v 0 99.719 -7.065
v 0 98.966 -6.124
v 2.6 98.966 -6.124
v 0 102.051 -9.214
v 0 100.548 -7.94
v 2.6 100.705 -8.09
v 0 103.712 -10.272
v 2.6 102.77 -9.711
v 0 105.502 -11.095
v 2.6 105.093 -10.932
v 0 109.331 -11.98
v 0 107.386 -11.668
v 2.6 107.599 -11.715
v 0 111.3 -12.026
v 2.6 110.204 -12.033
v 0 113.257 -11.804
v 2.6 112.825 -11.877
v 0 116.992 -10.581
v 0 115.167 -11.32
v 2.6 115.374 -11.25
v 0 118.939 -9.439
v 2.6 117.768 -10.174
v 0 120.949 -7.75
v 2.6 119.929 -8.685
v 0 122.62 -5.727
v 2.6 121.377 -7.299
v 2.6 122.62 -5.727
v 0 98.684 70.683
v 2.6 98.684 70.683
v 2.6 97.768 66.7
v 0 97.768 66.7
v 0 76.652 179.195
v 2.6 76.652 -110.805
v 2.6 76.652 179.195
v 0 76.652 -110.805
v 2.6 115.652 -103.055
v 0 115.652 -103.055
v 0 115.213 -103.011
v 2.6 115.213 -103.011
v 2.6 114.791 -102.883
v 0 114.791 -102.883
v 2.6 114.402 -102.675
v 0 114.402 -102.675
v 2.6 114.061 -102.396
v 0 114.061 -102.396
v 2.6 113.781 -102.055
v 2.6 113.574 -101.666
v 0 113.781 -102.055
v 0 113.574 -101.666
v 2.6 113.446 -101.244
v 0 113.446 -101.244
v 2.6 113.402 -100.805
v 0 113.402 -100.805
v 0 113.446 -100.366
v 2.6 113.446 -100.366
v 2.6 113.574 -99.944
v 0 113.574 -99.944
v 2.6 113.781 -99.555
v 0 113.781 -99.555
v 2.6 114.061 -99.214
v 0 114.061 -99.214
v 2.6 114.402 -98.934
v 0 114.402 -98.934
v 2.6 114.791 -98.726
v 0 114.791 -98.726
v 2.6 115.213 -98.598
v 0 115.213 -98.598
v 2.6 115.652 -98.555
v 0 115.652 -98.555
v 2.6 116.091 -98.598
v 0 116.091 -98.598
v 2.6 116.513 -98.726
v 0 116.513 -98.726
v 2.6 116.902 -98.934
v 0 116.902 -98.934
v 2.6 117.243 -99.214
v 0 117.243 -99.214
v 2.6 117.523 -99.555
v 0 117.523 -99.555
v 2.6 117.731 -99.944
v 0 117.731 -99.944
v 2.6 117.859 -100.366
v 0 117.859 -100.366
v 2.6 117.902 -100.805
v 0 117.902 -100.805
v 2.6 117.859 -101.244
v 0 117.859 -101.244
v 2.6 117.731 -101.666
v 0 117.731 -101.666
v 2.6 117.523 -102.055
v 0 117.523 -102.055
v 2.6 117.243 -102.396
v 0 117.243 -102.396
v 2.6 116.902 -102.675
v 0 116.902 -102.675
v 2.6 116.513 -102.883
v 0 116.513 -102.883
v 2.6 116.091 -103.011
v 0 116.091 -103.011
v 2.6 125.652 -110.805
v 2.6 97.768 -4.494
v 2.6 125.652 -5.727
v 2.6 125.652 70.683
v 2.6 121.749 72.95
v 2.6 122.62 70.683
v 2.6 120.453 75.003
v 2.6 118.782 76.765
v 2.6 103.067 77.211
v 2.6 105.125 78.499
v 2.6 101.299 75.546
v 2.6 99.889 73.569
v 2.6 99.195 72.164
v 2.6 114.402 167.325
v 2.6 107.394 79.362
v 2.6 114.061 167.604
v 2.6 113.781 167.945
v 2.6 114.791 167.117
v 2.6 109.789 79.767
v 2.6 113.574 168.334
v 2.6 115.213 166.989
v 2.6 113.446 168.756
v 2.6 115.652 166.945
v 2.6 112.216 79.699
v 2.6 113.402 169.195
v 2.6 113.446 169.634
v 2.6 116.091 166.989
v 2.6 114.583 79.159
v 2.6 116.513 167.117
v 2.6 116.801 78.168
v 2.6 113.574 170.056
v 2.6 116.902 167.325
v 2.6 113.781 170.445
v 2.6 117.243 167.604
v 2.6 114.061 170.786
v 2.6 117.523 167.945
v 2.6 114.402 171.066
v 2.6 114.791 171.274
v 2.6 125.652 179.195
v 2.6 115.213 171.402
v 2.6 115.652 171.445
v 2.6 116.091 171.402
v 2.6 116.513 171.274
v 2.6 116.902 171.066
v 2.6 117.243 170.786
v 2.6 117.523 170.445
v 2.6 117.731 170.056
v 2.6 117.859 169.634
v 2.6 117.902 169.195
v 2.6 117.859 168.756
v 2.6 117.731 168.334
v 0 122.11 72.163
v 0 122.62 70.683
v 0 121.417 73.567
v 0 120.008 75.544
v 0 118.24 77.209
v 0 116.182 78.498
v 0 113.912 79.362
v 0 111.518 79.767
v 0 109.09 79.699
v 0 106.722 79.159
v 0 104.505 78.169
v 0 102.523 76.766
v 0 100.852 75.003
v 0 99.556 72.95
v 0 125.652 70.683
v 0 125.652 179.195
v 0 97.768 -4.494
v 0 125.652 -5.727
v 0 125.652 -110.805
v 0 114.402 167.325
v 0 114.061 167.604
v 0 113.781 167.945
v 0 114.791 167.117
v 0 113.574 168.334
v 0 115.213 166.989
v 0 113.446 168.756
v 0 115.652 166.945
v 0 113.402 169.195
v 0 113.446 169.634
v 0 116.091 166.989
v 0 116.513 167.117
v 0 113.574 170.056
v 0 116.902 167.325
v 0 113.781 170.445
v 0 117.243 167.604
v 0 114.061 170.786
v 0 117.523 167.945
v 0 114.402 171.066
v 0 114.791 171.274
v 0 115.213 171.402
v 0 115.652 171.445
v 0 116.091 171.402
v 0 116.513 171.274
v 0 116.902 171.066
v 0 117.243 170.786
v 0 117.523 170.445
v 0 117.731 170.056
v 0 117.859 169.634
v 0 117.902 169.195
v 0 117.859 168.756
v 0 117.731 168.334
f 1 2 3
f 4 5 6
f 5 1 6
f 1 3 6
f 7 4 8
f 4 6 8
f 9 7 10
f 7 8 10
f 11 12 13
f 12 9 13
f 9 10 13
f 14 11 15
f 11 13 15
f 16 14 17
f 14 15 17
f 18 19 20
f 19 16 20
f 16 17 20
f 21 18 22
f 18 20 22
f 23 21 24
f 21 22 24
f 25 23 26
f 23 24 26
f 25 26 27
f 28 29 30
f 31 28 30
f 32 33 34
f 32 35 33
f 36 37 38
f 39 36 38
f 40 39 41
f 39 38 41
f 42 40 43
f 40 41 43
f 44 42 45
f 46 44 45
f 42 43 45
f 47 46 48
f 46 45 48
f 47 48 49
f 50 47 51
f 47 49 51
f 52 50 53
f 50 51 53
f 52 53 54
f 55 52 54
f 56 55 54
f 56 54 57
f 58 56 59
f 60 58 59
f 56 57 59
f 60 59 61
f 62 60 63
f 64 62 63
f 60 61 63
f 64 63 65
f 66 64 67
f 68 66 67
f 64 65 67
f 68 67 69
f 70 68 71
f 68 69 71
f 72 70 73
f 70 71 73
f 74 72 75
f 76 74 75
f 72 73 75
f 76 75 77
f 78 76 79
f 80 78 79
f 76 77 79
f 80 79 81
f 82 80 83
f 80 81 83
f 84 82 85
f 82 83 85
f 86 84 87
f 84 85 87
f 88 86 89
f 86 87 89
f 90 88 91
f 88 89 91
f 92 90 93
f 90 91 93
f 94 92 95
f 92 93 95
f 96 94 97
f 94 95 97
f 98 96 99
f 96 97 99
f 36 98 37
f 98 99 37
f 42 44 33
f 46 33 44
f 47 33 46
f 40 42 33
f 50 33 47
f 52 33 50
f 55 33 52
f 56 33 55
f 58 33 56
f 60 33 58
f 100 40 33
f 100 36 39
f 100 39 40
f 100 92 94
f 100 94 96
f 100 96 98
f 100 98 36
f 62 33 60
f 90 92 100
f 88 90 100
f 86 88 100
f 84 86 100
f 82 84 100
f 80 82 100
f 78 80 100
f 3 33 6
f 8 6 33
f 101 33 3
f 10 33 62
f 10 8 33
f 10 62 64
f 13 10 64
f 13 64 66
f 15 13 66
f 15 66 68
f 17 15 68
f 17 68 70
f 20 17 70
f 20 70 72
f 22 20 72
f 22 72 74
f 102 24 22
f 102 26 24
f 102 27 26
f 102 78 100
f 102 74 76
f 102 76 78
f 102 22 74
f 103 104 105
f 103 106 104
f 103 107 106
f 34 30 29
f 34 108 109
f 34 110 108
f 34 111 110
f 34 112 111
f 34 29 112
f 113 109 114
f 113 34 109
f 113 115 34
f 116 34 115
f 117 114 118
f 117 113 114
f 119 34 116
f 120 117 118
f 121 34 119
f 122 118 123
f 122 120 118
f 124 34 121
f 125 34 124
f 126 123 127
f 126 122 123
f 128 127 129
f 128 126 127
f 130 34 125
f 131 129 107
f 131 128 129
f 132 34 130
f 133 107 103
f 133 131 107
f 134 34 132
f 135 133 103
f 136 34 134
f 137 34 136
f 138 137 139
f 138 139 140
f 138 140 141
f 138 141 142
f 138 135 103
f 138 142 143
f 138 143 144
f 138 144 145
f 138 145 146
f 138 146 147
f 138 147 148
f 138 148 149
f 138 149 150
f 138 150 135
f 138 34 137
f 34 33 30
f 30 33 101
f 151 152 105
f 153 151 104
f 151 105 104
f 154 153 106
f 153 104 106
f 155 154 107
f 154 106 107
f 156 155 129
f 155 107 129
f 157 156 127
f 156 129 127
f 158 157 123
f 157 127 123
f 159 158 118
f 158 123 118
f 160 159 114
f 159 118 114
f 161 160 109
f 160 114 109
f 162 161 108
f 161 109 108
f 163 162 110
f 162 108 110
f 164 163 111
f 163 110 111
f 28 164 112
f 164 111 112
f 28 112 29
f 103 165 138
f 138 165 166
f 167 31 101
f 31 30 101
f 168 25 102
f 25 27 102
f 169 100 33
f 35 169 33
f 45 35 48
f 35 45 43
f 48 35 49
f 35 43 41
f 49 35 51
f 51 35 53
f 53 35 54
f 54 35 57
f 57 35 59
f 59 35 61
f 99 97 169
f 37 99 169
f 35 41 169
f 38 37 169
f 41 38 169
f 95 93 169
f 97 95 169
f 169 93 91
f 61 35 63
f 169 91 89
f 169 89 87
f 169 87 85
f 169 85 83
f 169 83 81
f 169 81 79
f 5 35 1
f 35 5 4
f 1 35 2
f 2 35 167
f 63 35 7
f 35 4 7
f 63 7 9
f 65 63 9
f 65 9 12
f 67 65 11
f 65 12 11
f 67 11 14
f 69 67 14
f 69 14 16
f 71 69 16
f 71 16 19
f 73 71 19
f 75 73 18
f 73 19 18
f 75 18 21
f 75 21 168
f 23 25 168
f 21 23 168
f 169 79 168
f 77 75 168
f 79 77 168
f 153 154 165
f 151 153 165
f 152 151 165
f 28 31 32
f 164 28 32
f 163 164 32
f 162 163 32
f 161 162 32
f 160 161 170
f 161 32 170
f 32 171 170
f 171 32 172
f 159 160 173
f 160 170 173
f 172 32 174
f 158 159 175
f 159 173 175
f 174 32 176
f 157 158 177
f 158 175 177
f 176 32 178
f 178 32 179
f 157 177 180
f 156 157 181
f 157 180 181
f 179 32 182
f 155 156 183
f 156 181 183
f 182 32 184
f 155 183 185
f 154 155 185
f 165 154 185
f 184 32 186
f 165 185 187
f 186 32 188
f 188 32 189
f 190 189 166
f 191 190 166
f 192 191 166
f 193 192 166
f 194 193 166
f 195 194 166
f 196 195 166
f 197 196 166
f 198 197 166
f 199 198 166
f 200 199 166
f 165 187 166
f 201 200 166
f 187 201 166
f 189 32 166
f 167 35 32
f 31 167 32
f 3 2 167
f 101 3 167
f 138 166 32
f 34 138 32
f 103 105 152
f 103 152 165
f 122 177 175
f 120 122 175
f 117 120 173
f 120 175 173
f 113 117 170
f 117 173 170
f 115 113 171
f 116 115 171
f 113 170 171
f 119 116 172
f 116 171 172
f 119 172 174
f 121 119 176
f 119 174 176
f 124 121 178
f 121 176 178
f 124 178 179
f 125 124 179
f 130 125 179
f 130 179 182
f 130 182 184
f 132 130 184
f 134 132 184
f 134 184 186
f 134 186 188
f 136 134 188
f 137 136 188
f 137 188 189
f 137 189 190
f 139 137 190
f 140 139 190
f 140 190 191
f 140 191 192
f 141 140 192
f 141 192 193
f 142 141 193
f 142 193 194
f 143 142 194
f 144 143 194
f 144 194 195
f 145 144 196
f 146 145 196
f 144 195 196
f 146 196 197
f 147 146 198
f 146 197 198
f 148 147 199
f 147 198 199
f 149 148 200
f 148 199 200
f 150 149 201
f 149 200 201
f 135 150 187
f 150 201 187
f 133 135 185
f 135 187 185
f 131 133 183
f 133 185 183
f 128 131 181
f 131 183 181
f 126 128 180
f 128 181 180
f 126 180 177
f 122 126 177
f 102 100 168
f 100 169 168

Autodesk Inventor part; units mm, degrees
ref_plane "YZ Plane" through (0, 0, 0) normal (1, 0, 0) x (0, 1, 0)
ref_plane "XZ Plane" through (0, 0, 0) normal (0, 1, 0) x (-1, 0, 0)
sketch "スケッチ1" plane through (0, 0, 0) normal (1, 0, 0) x (0, 1, 0)
  line L0 (125.6523, 179.1954) -> (-474.3477, 179.1954)
  line L1 (-474.3477, 179.1954) -> (-474.3477, -102.8046)
  line L2 (-474.3477, -102.8046) -> (125.6523, -102.8046)
  line L3 (125.6523, -102.8046) -> (125.6523, 179.1954)
  dimension "d0" = 600
  dimension "d1" = 282
extrude "押し出し1" add sketch "スケッチ1" along normal blind 2.6
sketch "スケッチ4" plane through (2.6, 0, 0) normal (1, 0, 0) x (0, 0, -1)
  line L0 (102.8046, 125.6523) -> (-179.1954, 125.6523) projected
  line L1 (-179.1954, 125.6523) -> (-179.1954, -474.3477) projected
  point P0 (0, 0)
  point P1 (-139.1954, -225.3477)
  point P2 (-139.1954, -123.3477)
  dimension "d19" = 102
  dimension "d20" = 249
  dimension "d21" = 40
  dimension "d22" = 40
hole "穴2" at (2.6, -225.3477, 139.1954) at (2.6, -123.3477, 139.1954) direction (-1, 0, 0) diameter 6.6 end through all
sketch "スケッチ5" plane through (2.6, 0, 0) normal (1, 0, 0) x (0, 0, -1)
  line L0 (-179.1954, 125.6523) -> (-179.1954, -474.3477) projected
  line L1 (102.8046, 125.6523) -> (-179.1954, 125.6523) projected
  point P0 (-152.1954, -84.3477)
  dimension "d30" = 27
  dimension "d31" = 210
hole "穴3" at (2.6, -84.3477, 152.1954) direction (-1, 0, 0) diameter 18 end through all
sketch "スケッチ6" plane through (2.6, 0, 0) normal (1, 0, 0) x (0, 0, -1)
  line L0 (-179.1954, 125.6523) -> (-179.1954, -474.3477) projected
  circle A0 centre (-152.1954, -84.3477) radius 9 projected
  point P0 (0, 0)
  point P1 (-166.6954, -53.9477)
  point P2 (-151.6954, -53.9477)
  dimension "d39" = 12.5
  dimension "d40" = 27.5
  dimension "d41" = 30.4
  dimension "d42" = 30.4
hole "穴4" at (2.6, -53.9477, 166.6954) at (2.6, -53.9477, 151.6954) direction (-1, 0, 0) diameter 4.5 end through all
sketch "スケッチ7" plane through (2.6, 0, 0) normal (1, 0, 0) x (0, 0, -1)
  line L0 (102.8046, 125.6523) -> (-179.1954, 125.6523) projected
  line L1 (102.8046, -474.3477) -> (102.8046, 125.6523) projected
  line L2 (-179.1954, -474.3477) -> (102.8046, -474.3477) projected
  point P0 (0, 0)
  point P1 (84.0046, -56.9477)
  point P2 (84.0046, -291.9477)
  dimension "d50" = 182.6
  dimension "d51" = 18.8
  dimension "d52" = 18.8
  dimension "d53" = 182.4
hole "穴5" at (2.6, -56.9477, -84.0046) at (2.6, -291.9477, -84.0046) direction (-1, 0, 0) diameter 6.7 end through all
sketch "スケッチ8" plane through (2.6, 0, 0) normal (1, 0, 0) x (0, 0, -1)
  line L0 (102.8046, -474.3477) -> (102.8046, 125.6523) projected
  line L1 (102.8046, 125.6523) -> (110.8046, 125.6523)
  line L2 (117.7603, -23.9477) -> (102.8046, -23.9477)
  line L3 (102.8046, -89.9477) -> (117.7603, -89.9477)
  line L4 (110.8046, 125.6523) -> (110.8046, -474.3477)
  line L5 (110.8046, -474.3477) -> (102.8046, -474.3477)
  line L6 (102.8046, -258.9477) -> (110.8046, -258.9477)
  line L7 (102.8046, -324.9477) -> (110.8046, -324.9477)
  circle A0 centre (84.0046, -56.9477) radius 3.35 projected
  circle A1 centre (84.0046, -291.9477) radius 3.35 projected
  point P0 (0, 0)
  point P1 (110.8046, -23.9477)
  point P2 (110.8046, -89.9477)
  dimension "d61" = 8
  dimension "d62" = 33
  dimension "d63" = 33
  dimension "d64" = 33
  dimension "d65" = 33
extrude "押し出し3" add sketch "スケッチ8" against normal blind 2.6 contours L0 L7 L4 L5 | L0 L3 L4 L6 | L0 L1 L4 L2
sketch "スケッチ9" plane through (2.6, 0, 0) normal (1, 0, 0) x (0, 0, -1)
  ellipse E0 centre (-2.4593, 110.6523) end of major axis (-2.4593, 125.1521) minor radius 14.4996 (5.606, 98.6026) -> (5.606, 122.702) ccw
  line L0 (4.4935, 123.5363) -> (-99.9579, 123.5363) projected
  line L1 (-99.9579, 97.7683) -> (4.4935, 97.7683) projected
  ellipse E1 centre (-67.383, 110.6523) end of major axis (-67.383, 123.067) minor radius 12.4145 (-70.683, 122.6204) -> (-70.683, 98.6842) ccw projected
  line L2 (-70.683, 122.6204) -> (-70.683, 125.6523)
  line L3 (102.8046, 125.6523) -> (-179.1954, 125.6523) projected
  line L4 (5.7266, 122.6204) -> (5.7266, 125.6523)
  line L5 (5.7266, 125.6523) -> (-70.683, 125.6523)
  line L6 (6.1243, 98.9661) -> (4.4935, 97.7683)
  line L7 (-70.683, 98.6842) -> (-66.6998, 97.7683)
  point P0 (0, 0)
extrude "押し出し4" cut sketch "スケッチ9" against normal blind 3
ref_plane "作業平面2" through (0, 76.6523, 179.1954) normal (0, 1, 0) x (1, 0, 0)
split "分割2" plane through (0, 76.6523, 179.1954) removes the side toward (0, -1, 0)
sketch "スケッチ10" plane through (2.6, 0, 0) normal (1, 0, 0) x (0, 0, -1)
  line L0 (-70.683, 125.6523) -> (-179.1954, 125.6523) projected
  line L1 (-179.1954, 125.6523) -> (-179.1954, 76.6523) projected
  line L2 (110.8046, 125.6523) -> (5.7266, 125.6523) projected
  line L3 (110.8046, 76.6523) -> (110.8046, 125.6523) projected
  point P0 (0, 0)
  point P1 (-169.1954, 115.6523)
  point P2 (100.8046, 115.6523)
  dimension "d72" = 10
  dimension "d73" = 10
  dimension "d74" = 10
  dimension "d75" = 10
hole "穴6" at (2.6, 115.6523, 169.1954) at (2.6, 115.6523, -100.8046) direction (-1, 0, 0) diameter 4.5 depth 6 tip angle 118
properties part number "lc_box_side" material "ポリカーボネート、クリア"
